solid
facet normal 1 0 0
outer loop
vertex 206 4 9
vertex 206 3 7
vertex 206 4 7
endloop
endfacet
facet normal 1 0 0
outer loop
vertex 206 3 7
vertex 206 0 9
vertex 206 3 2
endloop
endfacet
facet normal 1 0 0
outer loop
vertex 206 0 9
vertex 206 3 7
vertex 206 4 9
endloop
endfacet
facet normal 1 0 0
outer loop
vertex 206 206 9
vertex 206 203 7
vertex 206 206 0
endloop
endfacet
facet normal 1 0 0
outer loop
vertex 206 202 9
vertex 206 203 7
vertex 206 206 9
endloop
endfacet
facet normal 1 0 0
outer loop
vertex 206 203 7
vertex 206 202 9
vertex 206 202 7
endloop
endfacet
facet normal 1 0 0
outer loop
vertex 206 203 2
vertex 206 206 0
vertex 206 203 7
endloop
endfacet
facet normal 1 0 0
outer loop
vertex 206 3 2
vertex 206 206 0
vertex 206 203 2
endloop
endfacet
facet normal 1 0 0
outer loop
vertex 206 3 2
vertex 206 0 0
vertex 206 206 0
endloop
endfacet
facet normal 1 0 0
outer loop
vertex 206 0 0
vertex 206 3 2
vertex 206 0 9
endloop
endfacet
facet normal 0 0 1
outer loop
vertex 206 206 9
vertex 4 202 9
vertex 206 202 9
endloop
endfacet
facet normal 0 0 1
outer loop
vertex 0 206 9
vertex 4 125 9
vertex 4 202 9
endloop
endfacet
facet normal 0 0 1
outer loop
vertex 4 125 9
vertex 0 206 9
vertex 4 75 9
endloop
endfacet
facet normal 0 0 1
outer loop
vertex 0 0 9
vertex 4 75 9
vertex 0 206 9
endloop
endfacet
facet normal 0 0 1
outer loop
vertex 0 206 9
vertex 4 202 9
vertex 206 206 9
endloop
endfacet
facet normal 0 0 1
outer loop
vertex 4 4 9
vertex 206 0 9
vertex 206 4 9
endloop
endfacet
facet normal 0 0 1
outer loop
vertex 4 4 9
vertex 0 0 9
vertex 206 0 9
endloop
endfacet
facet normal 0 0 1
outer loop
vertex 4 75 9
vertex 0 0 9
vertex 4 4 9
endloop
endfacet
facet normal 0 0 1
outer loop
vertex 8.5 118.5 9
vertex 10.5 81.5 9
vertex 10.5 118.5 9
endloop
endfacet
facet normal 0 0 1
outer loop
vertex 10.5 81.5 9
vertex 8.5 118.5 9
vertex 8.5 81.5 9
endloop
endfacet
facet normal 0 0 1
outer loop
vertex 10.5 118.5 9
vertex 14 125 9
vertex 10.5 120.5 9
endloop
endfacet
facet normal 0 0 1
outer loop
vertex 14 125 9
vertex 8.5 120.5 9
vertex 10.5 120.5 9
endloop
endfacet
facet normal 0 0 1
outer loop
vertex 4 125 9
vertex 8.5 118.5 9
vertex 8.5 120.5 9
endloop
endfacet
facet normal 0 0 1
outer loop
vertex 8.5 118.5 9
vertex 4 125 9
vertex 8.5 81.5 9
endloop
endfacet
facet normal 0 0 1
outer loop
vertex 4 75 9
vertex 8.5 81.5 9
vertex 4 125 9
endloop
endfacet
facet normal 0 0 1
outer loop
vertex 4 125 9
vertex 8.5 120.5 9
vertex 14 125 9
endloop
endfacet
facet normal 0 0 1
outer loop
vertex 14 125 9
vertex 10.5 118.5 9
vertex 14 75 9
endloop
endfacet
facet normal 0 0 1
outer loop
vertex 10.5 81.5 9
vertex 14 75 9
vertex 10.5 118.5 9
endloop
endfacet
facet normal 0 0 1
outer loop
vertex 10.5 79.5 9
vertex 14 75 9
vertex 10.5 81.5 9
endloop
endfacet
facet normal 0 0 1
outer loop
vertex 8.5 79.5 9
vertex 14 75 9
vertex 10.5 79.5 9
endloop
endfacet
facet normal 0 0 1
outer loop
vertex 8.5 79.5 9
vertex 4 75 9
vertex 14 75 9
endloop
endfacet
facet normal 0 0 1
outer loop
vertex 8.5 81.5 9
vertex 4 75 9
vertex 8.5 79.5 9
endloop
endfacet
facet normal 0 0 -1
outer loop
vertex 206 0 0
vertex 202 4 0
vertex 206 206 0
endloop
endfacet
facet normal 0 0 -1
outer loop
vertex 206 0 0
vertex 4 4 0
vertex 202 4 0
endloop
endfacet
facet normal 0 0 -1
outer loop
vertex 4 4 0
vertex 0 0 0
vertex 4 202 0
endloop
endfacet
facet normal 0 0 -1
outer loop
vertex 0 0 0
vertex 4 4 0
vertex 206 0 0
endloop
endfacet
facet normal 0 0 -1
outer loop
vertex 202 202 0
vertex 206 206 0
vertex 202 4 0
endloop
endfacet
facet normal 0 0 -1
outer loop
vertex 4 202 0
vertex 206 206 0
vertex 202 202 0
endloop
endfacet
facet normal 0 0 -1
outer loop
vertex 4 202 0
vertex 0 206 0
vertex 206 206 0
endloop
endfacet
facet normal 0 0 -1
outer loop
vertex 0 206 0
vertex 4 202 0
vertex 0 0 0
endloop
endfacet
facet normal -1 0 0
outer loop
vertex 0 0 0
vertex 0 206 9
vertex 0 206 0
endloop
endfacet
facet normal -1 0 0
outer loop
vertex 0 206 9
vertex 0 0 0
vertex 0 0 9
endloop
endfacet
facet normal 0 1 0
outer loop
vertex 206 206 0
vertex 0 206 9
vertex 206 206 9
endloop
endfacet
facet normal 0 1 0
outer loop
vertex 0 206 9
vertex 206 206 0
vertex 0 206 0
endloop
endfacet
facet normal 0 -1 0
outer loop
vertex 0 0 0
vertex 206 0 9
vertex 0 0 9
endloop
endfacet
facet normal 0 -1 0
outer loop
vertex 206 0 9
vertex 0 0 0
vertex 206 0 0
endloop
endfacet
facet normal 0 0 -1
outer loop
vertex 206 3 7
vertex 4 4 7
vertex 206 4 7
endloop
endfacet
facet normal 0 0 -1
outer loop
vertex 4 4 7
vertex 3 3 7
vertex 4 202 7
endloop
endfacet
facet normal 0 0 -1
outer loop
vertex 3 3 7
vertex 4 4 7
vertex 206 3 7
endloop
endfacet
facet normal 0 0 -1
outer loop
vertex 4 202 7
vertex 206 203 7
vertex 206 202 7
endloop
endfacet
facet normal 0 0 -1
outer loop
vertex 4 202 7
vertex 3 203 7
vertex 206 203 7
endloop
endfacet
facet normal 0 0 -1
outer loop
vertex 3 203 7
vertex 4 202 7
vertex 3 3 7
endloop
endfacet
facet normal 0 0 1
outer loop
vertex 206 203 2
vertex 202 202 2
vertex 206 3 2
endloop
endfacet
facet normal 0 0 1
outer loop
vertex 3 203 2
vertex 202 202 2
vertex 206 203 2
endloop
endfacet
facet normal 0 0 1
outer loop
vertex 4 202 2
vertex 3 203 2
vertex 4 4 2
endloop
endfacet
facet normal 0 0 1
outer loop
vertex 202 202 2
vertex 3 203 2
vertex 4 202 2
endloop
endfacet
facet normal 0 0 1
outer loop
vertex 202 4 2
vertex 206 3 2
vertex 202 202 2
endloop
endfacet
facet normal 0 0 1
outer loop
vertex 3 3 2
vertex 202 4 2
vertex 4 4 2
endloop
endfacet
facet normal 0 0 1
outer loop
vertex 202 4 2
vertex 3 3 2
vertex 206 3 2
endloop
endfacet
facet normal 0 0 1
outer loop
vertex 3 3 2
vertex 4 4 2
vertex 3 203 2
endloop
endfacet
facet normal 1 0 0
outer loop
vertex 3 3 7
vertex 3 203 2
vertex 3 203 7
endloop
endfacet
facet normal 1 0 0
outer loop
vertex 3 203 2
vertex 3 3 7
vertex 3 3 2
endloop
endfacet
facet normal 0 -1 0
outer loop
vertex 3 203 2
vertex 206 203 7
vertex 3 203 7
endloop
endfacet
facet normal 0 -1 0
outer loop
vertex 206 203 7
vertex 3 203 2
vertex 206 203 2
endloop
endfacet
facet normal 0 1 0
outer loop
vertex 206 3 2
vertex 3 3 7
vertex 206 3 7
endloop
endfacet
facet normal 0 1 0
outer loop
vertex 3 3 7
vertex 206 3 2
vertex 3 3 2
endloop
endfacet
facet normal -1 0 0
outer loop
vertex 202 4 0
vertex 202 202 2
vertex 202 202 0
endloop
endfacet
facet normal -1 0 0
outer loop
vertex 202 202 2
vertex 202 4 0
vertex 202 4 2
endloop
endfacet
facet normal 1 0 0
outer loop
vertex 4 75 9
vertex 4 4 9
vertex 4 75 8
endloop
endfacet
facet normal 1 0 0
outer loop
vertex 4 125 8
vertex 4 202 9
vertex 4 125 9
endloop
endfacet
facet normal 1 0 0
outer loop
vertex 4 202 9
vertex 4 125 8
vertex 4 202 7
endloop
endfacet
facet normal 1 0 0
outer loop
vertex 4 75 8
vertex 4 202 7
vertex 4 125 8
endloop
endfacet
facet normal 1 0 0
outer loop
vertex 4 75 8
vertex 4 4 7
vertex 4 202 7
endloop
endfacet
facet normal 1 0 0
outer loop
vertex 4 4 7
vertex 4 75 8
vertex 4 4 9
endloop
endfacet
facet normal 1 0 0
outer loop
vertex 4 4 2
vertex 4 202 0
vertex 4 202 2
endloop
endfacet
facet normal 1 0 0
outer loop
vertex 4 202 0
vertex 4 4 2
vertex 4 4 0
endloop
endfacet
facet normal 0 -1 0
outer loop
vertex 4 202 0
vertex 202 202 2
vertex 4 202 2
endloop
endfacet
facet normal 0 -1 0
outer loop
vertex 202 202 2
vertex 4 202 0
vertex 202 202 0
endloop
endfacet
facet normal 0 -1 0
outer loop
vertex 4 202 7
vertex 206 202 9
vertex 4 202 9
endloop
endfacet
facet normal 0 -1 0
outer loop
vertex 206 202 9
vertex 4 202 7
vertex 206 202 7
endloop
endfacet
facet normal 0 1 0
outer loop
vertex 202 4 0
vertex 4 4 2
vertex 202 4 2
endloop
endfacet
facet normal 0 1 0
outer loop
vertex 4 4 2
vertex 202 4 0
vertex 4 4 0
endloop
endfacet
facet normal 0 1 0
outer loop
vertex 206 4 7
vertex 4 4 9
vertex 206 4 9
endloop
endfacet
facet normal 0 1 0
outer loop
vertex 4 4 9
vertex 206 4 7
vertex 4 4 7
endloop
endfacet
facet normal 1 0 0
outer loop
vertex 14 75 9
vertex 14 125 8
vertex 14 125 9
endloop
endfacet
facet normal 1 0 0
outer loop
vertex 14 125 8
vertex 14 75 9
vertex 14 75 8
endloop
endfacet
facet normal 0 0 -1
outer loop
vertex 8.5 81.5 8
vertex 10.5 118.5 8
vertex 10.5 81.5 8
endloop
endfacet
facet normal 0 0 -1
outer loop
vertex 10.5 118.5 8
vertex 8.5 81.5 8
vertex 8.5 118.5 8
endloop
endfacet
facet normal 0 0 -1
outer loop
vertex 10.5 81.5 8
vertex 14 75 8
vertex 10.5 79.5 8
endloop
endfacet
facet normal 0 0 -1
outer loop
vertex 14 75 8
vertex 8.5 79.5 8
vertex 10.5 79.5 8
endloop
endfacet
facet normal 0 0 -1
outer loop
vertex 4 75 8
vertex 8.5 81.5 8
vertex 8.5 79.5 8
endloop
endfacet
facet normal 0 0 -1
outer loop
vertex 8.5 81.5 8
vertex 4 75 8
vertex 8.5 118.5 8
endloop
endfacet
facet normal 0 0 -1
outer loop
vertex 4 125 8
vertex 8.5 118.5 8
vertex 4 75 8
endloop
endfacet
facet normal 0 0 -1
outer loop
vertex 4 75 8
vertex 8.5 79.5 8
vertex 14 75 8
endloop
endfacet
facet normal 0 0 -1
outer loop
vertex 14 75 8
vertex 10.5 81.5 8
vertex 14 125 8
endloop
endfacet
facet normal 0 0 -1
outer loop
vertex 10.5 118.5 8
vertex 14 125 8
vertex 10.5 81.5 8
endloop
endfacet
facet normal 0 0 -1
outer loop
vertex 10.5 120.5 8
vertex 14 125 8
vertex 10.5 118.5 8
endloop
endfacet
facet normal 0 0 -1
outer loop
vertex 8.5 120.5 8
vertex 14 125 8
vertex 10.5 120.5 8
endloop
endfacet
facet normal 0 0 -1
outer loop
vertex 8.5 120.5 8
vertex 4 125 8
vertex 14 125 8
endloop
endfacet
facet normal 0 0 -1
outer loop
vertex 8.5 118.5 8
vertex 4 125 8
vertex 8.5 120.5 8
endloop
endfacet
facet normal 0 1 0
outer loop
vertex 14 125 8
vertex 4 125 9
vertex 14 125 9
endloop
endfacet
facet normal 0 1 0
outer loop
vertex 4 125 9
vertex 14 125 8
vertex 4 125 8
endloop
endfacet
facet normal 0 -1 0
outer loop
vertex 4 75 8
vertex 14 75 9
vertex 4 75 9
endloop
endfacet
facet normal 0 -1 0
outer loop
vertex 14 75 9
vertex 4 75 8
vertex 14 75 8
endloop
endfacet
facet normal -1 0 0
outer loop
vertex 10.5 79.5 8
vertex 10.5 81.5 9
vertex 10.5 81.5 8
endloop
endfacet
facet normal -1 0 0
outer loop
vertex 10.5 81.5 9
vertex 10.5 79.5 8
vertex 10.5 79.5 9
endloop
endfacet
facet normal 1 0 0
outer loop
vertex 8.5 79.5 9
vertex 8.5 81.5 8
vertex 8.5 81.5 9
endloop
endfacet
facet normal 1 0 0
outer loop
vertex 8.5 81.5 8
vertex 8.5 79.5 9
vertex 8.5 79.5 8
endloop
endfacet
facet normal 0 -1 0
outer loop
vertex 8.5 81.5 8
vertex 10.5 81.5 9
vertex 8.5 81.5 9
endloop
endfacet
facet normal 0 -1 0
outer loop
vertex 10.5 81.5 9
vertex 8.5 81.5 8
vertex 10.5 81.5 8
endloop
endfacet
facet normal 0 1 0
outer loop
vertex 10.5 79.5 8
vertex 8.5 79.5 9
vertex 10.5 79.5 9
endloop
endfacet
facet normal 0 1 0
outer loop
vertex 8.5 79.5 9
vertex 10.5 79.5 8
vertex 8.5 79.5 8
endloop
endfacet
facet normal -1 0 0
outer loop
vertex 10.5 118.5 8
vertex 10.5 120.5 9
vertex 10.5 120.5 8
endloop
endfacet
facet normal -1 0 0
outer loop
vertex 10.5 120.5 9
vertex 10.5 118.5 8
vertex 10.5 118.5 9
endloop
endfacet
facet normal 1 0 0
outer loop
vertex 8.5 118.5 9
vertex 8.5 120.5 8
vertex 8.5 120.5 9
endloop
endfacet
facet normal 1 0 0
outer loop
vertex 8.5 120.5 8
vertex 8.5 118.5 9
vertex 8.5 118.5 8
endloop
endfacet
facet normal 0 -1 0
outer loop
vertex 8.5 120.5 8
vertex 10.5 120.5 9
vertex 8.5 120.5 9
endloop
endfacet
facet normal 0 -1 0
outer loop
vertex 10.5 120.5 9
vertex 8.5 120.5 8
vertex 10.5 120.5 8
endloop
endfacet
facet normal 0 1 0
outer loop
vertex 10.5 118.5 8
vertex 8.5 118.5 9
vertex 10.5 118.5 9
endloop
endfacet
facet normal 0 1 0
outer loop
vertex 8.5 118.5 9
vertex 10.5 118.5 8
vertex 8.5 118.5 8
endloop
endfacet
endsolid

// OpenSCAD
$fn = 48;


union() {
	difference() {
		cube(size = [206, 206, 9]);
		translate(v = [3, 3, 2]) {
			cube(size = [203, 200, 5]);
		}
		translate(v = [4, 4, 0]) {
			cube(size = [198, 198, 15]);
		}
		translate(v = [4, 4, 2]) {
			cube(size = [203, 198, 15]);
		}
	}
	difference() {
		translate(v = [4, 75, 8]) {
			cube(size = [10, 50, 1]);
		}
		translate(v = [8.5000000000, 79.5000000000, 8]) {
			cube(size = [2, 2, 1]);
		}
		translate(v = [8.5000000000, 118.5000000000, 8]) {
			cube(size = [2, 2, 1]);
		}
	}
}
